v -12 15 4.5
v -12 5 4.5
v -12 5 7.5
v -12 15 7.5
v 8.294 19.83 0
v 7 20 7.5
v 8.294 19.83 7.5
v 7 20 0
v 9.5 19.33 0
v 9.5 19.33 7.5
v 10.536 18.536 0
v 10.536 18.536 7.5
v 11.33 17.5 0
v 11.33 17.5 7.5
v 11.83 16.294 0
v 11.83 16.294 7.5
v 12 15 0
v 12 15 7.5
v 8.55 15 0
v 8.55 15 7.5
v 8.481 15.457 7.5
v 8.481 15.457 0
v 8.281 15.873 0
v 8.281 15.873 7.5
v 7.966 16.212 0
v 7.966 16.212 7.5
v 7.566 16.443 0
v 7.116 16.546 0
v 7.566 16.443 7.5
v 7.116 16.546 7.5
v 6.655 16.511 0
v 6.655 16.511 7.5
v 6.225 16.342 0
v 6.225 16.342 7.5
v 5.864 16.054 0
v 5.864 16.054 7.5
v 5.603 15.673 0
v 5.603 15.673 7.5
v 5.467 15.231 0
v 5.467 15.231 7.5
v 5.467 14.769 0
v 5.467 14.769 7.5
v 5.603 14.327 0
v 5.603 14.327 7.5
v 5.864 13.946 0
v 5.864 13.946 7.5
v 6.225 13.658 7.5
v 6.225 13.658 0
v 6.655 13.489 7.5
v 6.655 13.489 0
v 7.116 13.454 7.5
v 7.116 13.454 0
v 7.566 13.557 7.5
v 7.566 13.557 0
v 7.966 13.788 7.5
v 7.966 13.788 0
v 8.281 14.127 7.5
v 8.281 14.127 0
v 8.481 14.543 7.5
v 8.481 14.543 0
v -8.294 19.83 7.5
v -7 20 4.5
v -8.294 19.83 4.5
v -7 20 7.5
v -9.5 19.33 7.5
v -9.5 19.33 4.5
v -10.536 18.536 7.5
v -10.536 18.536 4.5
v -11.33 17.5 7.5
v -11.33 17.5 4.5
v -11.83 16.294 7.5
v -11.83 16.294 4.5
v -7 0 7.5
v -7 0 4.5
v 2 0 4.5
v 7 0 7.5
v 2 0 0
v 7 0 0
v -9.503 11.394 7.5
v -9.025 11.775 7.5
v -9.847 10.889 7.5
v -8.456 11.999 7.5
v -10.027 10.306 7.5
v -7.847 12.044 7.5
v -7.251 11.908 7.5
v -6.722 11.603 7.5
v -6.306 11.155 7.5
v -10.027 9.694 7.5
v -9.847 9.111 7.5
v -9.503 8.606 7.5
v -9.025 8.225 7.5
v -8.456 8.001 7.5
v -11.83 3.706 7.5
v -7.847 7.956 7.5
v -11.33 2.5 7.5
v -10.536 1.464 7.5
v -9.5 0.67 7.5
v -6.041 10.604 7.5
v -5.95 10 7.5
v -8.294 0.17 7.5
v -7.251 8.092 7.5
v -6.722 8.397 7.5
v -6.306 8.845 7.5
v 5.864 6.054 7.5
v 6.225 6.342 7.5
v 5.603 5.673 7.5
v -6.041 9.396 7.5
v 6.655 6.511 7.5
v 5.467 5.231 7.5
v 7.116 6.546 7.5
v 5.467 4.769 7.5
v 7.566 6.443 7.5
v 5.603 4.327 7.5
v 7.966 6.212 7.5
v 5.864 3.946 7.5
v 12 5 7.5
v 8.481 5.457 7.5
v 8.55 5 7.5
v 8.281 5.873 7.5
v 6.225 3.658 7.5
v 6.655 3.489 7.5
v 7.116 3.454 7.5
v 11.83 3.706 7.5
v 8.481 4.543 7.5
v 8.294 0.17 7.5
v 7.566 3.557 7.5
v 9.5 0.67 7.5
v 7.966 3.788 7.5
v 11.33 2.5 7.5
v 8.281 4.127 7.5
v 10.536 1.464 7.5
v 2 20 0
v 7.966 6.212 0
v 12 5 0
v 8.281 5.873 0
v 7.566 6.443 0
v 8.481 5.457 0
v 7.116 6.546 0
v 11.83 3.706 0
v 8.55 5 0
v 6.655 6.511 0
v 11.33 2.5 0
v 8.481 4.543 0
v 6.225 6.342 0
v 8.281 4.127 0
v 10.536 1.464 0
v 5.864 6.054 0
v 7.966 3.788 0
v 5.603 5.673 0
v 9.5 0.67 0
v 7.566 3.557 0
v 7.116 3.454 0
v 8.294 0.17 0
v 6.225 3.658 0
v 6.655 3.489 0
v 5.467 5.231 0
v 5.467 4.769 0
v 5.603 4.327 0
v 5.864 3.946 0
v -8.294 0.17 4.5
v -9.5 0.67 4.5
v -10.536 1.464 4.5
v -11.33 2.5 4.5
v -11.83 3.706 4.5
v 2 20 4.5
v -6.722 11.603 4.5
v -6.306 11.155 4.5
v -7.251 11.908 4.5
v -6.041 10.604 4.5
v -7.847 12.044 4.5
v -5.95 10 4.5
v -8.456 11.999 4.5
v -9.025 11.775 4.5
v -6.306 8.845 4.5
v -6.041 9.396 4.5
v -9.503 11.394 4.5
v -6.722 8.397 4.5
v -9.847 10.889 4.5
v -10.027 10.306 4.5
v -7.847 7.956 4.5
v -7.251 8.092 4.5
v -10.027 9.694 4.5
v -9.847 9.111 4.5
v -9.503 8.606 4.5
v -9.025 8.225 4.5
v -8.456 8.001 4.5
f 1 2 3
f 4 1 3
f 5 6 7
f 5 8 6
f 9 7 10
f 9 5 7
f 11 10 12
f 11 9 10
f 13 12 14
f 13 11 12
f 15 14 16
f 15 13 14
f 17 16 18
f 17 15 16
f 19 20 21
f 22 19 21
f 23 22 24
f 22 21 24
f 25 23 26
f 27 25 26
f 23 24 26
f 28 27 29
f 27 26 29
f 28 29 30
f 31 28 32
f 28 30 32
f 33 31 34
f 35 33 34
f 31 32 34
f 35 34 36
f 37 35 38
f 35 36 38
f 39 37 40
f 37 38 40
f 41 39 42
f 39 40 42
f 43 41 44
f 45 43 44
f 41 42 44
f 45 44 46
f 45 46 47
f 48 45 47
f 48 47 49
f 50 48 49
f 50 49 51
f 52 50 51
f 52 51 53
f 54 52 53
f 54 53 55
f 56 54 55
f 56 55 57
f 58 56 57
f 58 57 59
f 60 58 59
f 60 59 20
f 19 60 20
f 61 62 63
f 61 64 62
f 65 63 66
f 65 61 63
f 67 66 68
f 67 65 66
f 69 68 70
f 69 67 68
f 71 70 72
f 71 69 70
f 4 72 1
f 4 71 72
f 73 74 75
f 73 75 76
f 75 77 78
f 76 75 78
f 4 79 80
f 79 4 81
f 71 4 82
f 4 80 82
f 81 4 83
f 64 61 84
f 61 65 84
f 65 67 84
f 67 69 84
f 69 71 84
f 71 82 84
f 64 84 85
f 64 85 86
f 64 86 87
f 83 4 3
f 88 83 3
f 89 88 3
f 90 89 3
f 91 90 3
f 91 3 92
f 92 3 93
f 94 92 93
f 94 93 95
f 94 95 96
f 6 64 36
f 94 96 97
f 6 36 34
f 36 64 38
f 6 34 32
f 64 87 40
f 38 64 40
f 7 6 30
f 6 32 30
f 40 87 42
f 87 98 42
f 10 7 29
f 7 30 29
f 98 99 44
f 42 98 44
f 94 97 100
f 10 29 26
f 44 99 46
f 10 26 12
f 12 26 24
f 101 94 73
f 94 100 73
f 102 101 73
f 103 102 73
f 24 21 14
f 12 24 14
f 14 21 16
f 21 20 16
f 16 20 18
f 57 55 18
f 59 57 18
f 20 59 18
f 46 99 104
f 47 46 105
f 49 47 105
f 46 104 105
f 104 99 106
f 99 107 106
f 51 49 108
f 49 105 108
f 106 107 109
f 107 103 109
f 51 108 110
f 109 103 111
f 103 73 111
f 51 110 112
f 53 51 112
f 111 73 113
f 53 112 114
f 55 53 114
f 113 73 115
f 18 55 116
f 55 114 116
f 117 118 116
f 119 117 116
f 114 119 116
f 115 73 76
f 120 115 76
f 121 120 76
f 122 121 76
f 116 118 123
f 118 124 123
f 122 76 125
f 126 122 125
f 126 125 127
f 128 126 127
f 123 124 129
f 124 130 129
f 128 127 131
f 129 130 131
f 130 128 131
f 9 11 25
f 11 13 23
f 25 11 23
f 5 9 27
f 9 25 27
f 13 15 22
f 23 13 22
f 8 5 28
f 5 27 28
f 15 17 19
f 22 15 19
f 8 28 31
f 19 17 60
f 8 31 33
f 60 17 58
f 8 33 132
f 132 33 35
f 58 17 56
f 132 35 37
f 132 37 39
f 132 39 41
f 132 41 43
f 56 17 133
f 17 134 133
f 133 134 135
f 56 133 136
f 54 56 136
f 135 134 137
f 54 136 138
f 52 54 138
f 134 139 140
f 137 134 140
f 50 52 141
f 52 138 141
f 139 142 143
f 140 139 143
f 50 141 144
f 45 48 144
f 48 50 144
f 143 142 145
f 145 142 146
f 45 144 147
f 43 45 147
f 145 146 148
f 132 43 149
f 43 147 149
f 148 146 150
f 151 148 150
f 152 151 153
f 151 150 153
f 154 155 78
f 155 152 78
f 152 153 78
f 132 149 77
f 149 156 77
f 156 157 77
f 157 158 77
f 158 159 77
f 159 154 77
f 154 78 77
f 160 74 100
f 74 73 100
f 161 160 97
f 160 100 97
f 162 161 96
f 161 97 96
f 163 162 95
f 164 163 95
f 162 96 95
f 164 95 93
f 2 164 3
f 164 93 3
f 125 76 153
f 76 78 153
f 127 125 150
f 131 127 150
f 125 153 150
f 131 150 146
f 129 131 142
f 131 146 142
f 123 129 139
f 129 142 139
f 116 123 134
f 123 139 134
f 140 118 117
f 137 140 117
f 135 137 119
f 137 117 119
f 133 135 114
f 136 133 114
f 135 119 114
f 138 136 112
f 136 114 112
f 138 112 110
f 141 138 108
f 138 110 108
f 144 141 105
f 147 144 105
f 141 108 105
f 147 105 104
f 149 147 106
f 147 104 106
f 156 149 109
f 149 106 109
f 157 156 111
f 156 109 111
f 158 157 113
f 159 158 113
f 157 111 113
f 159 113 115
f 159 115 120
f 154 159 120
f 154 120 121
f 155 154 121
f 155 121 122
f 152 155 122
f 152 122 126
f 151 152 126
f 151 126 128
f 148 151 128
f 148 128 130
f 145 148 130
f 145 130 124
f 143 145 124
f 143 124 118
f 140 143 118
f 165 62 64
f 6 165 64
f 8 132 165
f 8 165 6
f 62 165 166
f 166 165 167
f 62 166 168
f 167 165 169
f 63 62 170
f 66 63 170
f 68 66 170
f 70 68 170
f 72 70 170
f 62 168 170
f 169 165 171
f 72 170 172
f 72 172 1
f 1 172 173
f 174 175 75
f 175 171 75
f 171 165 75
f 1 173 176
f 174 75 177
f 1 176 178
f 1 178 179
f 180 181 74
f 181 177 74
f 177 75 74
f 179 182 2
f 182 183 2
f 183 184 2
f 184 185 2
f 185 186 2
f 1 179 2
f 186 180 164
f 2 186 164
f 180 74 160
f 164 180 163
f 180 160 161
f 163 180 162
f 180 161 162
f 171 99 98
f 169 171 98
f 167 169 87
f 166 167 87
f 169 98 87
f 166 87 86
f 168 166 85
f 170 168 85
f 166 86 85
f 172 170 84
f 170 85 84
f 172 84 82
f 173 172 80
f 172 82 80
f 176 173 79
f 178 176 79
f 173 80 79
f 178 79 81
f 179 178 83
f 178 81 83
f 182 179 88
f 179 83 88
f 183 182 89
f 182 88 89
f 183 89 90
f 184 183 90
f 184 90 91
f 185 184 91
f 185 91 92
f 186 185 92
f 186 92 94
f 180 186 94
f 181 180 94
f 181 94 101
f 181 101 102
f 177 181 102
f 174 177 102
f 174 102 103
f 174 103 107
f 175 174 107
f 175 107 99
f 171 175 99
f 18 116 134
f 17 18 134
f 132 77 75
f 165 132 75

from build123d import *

# Parameters (mm, degrees)
AUFSATZ_LINEAR_AUSTRAGEN1_DEPTH = 20
SKIZZE2_R                       = 2.05
SKIZZE2_R_2                     = 1.55
SCHNITT_LINEAR_AUSTRAGEN1_DEPTH = 25.5
VERRUNDUNG1_R                   = 5


with BuildPart() as part:
    # Skizze1 → Aufsatz-Linear austragen1 (new body)
    with BuildSketch(Plane(origin=(0, 0, 0), x_dir=(1, 0, 0), z_dir=(0, 1, 0))):
        Polygon((2, -4.5), (-12, -4.5), (-12, -7.5), (12, -7.5), (12, 0), (2, 0), align=None)
    extrude(amount=AUFSATZ_LINEAR_AUSTRAGEN1_DEPTH)

    # Skizze2 → Schnitt-Linear austragen1 (cut, through all)
    with BuildSketch(Plane.XY.offset(7.5)):
        with Locations((-8, 10)):
            Circle(SKIZZE2_R)
        with Locations((7, 15)):
            Circle(SKIZZE2_R_2)
        with Locations((7, 5)):
            Circle(SKIZZE2_R_2)
    extrude(amount=-SCHNITT_LINEAR_AUSTRAGEN1_DEPTH, mode=Mode.SUBTRACT)

    # Verrundung1
    verrundung1_edges = [part.edges().sort_by_distance(p)[0] for p in [
        (-12, 20, 6),
        (12, 20, 3.75),
        (12, 0, 3.75),
        (-12, 0, 6),
    ]]
    fillet(verrundung1_edges, radius=VERRUNDUNG1_R)


solid = part.part
